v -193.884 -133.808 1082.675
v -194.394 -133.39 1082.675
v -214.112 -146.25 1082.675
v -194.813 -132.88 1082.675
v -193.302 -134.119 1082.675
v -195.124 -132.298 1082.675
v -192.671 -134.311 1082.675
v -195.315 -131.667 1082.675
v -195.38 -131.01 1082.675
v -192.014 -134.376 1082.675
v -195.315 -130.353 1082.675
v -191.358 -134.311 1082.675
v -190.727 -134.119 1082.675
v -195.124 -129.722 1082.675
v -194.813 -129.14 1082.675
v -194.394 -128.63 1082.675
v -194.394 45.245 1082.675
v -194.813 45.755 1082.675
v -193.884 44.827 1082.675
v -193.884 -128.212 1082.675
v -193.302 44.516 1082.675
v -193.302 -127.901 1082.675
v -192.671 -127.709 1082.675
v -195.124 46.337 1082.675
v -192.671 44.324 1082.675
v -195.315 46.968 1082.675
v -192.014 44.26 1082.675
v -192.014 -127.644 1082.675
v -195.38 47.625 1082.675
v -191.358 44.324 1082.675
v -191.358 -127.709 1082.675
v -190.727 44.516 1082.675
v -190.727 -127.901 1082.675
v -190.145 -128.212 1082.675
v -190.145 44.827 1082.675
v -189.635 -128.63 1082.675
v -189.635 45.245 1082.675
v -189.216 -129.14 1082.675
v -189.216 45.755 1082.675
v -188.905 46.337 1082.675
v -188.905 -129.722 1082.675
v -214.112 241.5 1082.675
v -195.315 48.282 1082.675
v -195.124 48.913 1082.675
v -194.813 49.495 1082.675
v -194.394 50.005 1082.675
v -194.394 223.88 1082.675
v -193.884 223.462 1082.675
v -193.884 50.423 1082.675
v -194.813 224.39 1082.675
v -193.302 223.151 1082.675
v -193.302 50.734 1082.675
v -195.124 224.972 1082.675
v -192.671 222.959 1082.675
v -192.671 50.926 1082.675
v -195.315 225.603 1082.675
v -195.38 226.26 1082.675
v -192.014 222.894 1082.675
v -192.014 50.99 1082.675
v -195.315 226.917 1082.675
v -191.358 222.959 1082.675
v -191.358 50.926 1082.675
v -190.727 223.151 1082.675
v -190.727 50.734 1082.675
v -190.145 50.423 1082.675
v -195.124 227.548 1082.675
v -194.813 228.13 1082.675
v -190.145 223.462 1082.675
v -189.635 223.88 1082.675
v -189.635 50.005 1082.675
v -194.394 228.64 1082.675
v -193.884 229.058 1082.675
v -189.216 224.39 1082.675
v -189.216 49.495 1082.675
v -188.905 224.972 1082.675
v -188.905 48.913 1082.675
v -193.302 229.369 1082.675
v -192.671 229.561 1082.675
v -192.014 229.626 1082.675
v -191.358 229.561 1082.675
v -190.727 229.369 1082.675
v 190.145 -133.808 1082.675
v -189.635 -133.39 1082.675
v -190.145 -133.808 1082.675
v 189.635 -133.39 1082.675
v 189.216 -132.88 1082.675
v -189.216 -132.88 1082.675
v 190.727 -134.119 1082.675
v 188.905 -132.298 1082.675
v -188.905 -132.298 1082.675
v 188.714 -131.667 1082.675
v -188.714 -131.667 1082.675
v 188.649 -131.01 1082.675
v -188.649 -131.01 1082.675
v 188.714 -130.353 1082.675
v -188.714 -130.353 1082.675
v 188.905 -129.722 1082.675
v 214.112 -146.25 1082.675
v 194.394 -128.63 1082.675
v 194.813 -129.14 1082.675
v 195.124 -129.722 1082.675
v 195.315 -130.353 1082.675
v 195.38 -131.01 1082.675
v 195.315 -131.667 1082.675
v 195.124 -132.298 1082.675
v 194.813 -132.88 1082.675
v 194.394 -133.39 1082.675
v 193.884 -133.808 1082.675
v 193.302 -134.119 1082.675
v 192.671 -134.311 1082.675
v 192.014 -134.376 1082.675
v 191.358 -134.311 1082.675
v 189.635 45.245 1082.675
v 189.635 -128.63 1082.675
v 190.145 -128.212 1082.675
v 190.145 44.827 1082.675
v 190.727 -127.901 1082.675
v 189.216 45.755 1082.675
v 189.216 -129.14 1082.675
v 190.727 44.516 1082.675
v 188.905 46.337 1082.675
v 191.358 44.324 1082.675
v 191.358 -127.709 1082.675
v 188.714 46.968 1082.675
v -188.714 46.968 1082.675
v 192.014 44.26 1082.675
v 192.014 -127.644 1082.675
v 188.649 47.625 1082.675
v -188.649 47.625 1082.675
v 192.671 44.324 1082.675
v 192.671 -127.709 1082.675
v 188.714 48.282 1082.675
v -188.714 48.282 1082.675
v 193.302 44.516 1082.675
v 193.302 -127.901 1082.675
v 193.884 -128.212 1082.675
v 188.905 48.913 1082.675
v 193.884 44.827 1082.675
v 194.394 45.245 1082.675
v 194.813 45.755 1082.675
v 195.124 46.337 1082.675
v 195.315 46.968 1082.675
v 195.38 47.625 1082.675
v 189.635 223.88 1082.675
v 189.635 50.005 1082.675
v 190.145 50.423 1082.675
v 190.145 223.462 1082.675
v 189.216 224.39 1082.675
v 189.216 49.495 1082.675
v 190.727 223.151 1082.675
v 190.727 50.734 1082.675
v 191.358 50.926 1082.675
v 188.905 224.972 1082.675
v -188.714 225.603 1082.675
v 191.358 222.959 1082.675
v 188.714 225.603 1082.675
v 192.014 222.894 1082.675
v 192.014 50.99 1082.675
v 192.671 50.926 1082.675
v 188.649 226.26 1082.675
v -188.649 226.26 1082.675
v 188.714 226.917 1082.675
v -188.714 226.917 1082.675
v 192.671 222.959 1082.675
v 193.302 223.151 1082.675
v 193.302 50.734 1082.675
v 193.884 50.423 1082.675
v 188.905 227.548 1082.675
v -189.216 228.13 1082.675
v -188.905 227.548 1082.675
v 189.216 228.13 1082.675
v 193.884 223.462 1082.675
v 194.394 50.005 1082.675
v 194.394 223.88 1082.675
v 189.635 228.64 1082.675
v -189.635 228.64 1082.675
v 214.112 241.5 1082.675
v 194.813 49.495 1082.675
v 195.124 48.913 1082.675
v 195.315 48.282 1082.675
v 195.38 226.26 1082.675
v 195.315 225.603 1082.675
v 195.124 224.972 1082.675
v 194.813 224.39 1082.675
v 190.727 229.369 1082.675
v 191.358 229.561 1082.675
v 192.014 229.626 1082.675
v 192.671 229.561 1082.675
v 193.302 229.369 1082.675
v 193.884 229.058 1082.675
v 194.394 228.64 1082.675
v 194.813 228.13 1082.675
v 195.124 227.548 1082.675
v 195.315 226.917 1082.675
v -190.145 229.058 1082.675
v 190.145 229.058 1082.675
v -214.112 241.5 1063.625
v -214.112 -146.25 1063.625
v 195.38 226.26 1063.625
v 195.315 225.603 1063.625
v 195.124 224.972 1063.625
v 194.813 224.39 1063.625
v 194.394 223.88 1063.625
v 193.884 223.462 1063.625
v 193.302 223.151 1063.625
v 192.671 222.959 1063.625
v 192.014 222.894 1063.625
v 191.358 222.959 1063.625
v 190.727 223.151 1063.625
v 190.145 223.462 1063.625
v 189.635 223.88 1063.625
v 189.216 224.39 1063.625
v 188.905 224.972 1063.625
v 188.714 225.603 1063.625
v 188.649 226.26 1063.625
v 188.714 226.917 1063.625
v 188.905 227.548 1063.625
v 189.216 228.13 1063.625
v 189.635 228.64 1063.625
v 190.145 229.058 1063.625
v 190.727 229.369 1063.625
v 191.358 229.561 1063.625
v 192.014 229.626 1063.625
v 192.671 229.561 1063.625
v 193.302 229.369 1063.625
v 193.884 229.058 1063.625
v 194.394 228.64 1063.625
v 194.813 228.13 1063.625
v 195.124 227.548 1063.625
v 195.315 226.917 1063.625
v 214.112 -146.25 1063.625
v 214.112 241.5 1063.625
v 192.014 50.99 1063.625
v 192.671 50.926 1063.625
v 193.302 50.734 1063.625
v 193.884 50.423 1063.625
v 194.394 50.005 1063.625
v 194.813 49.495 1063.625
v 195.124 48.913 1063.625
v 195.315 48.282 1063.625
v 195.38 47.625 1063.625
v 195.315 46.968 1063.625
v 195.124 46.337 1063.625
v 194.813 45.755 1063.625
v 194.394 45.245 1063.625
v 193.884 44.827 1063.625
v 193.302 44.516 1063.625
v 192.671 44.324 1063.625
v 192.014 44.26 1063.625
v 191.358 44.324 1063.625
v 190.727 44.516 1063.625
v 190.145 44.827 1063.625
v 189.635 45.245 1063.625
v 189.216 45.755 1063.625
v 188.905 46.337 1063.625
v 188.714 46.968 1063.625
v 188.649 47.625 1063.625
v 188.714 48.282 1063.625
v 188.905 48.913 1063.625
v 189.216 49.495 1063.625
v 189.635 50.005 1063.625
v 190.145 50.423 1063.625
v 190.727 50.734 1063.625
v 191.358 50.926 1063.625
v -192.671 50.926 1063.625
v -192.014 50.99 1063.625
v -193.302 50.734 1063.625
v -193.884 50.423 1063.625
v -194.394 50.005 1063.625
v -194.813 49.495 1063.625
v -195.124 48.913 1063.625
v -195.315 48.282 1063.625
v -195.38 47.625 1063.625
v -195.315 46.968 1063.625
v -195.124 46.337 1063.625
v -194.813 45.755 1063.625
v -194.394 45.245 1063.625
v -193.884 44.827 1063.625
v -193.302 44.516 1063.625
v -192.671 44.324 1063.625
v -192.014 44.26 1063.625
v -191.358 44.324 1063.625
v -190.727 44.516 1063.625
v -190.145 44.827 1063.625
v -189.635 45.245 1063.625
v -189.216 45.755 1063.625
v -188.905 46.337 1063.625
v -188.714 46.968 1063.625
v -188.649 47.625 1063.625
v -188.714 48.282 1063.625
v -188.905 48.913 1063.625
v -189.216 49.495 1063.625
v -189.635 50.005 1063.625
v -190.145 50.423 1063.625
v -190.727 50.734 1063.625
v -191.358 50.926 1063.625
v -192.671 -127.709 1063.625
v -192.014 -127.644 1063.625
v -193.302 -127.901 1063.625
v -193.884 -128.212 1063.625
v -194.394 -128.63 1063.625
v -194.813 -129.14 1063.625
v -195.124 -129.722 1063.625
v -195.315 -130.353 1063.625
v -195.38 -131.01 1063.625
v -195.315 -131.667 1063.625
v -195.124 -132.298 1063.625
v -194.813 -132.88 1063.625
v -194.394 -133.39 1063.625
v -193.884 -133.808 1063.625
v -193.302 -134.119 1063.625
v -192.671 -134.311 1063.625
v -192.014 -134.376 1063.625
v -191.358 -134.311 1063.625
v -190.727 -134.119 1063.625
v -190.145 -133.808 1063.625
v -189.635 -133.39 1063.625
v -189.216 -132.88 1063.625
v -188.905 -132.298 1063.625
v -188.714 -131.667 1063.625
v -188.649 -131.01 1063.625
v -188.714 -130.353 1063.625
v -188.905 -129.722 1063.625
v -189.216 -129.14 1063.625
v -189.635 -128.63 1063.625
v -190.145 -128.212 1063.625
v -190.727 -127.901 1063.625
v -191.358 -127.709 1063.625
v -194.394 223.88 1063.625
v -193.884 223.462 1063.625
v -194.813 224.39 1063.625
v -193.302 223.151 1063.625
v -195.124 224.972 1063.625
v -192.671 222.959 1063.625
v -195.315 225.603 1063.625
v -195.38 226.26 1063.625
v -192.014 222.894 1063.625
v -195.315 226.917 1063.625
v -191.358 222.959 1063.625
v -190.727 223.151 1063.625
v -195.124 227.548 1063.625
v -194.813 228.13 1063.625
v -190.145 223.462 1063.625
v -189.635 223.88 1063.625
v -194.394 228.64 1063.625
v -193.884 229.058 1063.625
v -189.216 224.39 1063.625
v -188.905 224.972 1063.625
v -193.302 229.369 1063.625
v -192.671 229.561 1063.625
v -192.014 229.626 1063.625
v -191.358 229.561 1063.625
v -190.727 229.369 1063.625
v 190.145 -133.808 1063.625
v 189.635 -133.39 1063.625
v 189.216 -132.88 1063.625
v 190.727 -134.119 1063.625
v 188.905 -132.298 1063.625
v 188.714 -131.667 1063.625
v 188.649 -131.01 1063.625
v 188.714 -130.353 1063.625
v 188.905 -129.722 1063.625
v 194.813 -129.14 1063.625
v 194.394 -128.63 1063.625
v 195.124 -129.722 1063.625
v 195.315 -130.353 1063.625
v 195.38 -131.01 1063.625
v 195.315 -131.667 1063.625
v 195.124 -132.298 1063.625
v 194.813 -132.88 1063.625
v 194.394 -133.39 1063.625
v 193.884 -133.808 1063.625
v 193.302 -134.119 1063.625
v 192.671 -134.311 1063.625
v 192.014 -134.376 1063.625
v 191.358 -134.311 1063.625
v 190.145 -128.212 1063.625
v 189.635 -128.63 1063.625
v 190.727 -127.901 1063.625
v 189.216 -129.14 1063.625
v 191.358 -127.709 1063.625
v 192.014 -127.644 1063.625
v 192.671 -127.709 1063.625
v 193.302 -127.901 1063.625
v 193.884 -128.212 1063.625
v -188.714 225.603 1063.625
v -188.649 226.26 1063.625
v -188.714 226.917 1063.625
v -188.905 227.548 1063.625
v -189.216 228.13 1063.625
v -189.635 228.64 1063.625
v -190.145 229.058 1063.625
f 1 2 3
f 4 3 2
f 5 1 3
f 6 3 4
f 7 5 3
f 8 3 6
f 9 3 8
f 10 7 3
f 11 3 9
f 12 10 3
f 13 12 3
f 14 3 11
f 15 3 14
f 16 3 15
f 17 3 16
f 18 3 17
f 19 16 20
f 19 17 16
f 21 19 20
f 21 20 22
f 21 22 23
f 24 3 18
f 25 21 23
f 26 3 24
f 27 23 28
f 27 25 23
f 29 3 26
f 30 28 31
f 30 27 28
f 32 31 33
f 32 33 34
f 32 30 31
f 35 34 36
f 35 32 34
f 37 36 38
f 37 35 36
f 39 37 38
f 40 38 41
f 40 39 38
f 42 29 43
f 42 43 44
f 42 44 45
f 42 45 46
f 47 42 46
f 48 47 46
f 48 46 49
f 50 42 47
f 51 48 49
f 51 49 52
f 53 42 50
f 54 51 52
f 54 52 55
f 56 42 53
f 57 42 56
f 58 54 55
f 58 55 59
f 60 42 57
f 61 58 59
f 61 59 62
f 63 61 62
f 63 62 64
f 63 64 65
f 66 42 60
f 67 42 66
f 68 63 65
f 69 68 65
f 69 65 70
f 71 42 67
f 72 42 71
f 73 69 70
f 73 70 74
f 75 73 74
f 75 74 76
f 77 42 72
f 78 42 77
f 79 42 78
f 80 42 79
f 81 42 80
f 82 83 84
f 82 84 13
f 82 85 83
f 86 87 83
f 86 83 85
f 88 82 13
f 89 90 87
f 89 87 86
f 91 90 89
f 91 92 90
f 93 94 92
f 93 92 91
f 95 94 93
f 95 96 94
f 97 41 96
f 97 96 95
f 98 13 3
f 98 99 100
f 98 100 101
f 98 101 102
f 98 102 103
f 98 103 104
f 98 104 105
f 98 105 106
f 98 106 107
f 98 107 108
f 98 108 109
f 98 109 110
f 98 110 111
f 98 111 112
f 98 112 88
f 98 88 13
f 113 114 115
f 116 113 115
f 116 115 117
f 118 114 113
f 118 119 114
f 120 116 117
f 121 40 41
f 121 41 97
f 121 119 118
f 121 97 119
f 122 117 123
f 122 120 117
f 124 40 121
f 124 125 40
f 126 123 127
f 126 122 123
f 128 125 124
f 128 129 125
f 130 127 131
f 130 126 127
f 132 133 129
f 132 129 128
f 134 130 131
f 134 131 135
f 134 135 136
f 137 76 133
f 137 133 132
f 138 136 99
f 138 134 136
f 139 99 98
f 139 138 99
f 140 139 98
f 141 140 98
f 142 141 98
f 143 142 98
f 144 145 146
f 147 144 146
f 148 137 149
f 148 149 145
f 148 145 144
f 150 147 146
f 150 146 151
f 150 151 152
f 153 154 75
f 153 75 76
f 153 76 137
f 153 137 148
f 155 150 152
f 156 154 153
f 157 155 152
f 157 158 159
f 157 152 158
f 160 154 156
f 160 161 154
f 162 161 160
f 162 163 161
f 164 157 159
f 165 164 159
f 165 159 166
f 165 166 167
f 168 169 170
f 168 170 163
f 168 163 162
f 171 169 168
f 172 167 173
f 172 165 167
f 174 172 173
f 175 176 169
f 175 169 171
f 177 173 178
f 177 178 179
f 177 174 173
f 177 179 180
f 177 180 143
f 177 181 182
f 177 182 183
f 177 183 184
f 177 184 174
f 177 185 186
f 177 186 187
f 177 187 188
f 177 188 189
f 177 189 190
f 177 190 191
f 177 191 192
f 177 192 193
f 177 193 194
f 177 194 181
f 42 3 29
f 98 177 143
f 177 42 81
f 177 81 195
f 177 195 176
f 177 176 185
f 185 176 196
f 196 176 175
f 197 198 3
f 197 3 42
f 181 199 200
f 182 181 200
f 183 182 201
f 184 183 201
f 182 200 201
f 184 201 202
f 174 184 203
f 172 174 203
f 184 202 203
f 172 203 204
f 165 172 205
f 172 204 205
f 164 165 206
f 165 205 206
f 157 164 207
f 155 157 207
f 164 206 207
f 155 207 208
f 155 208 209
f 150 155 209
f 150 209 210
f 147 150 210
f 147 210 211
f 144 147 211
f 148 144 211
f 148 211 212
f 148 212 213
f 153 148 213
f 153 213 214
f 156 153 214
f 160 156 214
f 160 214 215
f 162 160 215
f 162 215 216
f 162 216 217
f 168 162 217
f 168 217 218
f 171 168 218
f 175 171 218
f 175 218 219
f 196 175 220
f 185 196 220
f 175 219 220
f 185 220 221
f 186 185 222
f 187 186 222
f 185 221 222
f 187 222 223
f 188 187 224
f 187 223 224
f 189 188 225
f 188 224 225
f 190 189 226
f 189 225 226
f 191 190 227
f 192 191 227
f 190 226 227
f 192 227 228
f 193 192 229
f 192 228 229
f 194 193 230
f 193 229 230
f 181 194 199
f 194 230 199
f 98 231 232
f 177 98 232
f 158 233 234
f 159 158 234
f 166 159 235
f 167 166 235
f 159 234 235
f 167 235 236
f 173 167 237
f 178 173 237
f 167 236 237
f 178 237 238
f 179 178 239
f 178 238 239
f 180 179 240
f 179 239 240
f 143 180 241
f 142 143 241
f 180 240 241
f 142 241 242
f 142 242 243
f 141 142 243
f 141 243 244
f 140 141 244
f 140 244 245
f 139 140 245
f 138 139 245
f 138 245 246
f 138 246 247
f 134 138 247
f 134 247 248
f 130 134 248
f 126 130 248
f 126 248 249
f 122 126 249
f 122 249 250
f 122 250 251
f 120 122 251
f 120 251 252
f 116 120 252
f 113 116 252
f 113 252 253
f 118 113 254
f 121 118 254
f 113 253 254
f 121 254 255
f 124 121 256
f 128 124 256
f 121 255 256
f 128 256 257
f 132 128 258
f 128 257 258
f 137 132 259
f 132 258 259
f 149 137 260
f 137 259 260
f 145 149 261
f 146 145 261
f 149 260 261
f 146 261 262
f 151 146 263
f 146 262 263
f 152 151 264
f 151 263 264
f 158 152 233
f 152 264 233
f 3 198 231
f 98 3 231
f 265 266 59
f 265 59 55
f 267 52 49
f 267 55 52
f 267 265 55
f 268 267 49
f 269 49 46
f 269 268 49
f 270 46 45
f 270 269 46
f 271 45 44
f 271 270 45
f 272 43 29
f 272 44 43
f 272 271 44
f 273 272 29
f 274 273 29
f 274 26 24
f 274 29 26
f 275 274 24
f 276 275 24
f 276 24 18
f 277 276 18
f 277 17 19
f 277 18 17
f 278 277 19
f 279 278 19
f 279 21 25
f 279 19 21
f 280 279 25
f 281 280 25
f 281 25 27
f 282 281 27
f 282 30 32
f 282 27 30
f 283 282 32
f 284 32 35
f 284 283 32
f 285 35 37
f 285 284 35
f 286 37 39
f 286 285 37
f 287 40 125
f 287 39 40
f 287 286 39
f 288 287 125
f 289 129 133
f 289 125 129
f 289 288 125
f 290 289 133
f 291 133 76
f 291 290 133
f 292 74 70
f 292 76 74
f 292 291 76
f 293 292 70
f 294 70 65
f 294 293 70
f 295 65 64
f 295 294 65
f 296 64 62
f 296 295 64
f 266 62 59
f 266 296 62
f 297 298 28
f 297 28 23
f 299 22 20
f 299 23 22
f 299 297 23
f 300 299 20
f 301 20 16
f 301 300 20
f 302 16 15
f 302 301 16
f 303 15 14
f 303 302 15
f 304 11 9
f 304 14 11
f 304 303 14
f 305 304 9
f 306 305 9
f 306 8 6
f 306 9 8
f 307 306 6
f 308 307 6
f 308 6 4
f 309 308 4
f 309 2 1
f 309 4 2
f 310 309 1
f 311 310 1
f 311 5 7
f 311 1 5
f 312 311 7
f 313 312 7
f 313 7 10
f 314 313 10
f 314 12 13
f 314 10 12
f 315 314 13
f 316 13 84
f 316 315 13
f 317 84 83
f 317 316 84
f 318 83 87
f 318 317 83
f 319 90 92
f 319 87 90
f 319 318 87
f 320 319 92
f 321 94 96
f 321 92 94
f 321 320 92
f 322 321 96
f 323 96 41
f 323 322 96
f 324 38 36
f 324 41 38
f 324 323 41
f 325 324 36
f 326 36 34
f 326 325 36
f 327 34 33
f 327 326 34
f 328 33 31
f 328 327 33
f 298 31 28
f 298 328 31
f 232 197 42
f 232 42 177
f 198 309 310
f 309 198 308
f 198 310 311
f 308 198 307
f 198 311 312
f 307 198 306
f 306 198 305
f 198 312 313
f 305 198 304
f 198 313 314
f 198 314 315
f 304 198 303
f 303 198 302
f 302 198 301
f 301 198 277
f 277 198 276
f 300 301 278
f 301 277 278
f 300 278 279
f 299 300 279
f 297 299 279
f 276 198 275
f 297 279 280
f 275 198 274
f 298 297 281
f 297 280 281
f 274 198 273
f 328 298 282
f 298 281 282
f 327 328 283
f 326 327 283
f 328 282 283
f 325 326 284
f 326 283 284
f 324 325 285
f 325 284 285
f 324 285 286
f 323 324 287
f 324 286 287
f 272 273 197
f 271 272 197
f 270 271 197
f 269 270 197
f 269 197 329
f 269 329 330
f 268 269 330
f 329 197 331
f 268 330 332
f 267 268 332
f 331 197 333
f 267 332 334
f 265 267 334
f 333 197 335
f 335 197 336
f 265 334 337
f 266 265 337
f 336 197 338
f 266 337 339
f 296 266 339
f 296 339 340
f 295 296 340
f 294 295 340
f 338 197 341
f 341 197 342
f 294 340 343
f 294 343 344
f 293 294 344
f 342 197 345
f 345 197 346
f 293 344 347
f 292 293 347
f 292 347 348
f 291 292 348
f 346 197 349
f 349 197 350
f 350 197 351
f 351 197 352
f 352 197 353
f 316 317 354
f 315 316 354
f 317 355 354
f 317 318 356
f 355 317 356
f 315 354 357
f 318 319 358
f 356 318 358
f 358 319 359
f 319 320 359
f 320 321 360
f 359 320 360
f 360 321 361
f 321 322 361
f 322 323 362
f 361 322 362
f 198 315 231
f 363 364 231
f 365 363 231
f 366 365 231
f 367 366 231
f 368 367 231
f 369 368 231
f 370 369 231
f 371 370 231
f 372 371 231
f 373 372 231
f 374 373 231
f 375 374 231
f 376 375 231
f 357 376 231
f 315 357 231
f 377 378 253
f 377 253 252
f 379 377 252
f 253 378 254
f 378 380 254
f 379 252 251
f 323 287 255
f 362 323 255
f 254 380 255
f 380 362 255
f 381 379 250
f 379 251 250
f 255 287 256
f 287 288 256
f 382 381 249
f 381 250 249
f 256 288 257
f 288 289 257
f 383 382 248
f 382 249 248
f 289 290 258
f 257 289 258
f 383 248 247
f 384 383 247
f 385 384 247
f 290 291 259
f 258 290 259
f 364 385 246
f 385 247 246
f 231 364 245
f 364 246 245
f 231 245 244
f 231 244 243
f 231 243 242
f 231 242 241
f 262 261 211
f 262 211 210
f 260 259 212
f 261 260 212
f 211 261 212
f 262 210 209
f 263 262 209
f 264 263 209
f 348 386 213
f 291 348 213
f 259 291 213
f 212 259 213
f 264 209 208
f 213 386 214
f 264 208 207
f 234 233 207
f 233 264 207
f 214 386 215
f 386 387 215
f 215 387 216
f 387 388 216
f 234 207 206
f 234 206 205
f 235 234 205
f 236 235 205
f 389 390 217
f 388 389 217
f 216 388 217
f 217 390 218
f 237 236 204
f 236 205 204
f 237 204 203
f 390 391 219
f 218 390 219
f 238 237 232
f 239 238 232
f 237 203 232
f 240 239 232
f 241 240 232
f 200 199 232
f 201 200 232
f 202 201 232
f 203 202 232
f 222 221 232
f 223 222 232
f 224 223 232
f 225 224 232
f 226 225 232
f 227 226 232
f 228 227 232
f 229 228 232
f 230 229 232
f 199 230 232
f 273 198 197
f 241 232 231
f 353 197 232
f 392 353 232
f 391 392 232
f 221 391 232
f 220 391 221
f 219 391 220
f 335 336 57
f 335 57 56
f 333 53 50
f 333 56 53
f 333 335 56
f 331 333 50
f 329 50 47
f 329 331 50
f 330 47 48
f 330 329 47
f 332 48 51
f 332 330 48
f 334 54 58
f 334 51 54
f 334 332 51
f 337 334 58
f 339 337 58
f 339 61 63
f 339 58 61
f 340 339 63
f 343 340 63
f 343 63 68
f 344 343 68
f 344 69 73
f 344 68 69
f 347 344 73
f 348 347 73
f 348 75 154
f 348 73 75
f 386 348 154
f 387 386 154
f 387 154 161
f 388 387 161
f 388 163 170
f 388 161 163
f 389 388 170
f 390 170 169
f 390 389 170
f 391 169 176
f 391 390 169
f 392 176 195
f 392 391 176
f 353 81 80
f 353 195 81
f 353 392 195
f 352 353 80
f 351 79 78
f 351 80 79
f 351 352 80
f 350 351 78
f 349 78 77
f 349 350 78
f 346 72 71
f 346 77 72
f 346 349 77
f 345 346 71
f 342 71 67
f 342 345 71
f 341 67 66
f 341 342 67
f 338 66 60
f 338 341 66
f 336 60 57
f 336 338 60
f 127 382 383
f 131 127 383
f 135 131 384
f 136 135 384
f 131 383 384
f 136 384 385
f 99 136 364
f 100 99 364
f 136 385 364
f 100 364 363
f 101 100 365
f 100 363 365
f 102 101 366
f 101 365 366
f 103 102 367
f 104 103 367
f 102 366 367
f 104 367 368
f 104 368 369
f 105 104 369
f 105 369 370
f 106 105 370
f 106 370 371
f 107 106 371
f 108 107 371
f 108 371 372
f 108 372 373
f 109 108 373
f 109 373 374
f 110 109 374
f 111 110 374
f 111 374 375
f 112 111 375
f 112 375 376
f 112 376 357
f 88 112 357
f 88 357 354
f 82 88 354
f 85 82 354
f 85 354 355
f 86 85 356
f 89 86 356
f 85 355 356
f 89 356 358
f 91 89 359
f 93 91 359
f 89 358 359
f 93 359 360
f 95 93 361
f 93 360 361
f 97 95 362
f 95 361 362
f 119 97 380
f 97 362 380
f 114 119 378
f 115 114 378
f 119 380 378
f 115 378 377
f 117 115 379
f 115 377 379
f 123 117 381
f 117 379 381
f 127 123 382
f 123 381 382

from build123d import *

# Parameters (mm, degrees)
SKETCH1_W           = 428.225
SKETCH1_H           = 387.75
BOSS_EXTRUDE1_DEPTH = 19.05
SKETCH2_R           = 3.3655
CUT_EXTRUDE1_DEPTH  = 324.427773516
SKETCH3_R           = 3.3655
CUT_EXTRUDE2_DEPTH  = 324.427773516
SKETCH4_R           = 3.3655
CUT_EXTRUDE3_DEPTH  = 25.4


with BuildPart() as part:
    # Sketch1 → Boss-Extrude1 (new body)
    with BuildSketch(Plane.XY.offset(1063.625)):
        with Locations((0, 47.625)):
            Rectangle(SKETCH1_W, SKETCH1_H)
    extrude(amount=BOSS_EXTRUDE1_DEPTH)

    # Sketch2 → Cut-Extrude1 (cut, through all)
    with BuildSketch(Plane(origin=(0, 0, 1061.72), x_dir=(1, 0, 0), z_dir=(0, 0, -1))):
        with Locations(Location((192.0145, 131.01, 0), (0, 0, 270))):
            Circle(SKETCH2_R)
    cut_extrude1 = extrude(amount=-CUT_EXTRUDE1_DEPTH, mode=Mode.SUBTRACT)

    # Sketch3 → Cut-Extrude2 (cut, through all)
    with BuildSketch(Plane(origin=(0, 0, 1061.72), x_dir=(1, 0, 0), z_dir=(0, 0, -1))):
        with Locations(Location((192.0145, -47.625, 0), (0, 0, 270))):
            Circle(SKETCH3_R)
    cut_extrude2 = extrude(amount=-CUT_EXTRUDE2_DEPTH, mode=Mode.SUBTRACT)

    # Sketch4 → Cut-Extrude3 (cut)
    with BuildSketch(Plane(origin=(0, 0, 1061.72), x_dir=(1, 0, 0), z_dir=(0, 0, -1))):
        with Locations((192.0145, -226.26)):
            Circle(SKETCH4_R)
    cut_extrude3 = extrude(amount=-CUT_EXTRUDE3_DEPTH, mode=Mode.SUBTRACT)

    # Mirror1: Cut-Extrude1, Cut-Extrude2, Cut-Extrude3 across plane
    add(cut_extrude1.mirror(Plane(origin=(0, 0, 0), x_dir=(0, 0, 1), z_dir=(1, 0, 0))), mode=Mode.SUBTRACT)
    add(cut_extrude2.mirror(Plane(origin=(0, 0, 0), x_dir=(0, 0, 1), z_dir=(1, 0, 0))), mode=Mode.SUBTRACT)
    add(cut_extrude3.mirror(Plane(origin=(0, 0, 0), x_dir=(0, 0, 1), z_dir=(1, 0, 0))), mode=Mode.SUBTRACT)


solid = part.part
